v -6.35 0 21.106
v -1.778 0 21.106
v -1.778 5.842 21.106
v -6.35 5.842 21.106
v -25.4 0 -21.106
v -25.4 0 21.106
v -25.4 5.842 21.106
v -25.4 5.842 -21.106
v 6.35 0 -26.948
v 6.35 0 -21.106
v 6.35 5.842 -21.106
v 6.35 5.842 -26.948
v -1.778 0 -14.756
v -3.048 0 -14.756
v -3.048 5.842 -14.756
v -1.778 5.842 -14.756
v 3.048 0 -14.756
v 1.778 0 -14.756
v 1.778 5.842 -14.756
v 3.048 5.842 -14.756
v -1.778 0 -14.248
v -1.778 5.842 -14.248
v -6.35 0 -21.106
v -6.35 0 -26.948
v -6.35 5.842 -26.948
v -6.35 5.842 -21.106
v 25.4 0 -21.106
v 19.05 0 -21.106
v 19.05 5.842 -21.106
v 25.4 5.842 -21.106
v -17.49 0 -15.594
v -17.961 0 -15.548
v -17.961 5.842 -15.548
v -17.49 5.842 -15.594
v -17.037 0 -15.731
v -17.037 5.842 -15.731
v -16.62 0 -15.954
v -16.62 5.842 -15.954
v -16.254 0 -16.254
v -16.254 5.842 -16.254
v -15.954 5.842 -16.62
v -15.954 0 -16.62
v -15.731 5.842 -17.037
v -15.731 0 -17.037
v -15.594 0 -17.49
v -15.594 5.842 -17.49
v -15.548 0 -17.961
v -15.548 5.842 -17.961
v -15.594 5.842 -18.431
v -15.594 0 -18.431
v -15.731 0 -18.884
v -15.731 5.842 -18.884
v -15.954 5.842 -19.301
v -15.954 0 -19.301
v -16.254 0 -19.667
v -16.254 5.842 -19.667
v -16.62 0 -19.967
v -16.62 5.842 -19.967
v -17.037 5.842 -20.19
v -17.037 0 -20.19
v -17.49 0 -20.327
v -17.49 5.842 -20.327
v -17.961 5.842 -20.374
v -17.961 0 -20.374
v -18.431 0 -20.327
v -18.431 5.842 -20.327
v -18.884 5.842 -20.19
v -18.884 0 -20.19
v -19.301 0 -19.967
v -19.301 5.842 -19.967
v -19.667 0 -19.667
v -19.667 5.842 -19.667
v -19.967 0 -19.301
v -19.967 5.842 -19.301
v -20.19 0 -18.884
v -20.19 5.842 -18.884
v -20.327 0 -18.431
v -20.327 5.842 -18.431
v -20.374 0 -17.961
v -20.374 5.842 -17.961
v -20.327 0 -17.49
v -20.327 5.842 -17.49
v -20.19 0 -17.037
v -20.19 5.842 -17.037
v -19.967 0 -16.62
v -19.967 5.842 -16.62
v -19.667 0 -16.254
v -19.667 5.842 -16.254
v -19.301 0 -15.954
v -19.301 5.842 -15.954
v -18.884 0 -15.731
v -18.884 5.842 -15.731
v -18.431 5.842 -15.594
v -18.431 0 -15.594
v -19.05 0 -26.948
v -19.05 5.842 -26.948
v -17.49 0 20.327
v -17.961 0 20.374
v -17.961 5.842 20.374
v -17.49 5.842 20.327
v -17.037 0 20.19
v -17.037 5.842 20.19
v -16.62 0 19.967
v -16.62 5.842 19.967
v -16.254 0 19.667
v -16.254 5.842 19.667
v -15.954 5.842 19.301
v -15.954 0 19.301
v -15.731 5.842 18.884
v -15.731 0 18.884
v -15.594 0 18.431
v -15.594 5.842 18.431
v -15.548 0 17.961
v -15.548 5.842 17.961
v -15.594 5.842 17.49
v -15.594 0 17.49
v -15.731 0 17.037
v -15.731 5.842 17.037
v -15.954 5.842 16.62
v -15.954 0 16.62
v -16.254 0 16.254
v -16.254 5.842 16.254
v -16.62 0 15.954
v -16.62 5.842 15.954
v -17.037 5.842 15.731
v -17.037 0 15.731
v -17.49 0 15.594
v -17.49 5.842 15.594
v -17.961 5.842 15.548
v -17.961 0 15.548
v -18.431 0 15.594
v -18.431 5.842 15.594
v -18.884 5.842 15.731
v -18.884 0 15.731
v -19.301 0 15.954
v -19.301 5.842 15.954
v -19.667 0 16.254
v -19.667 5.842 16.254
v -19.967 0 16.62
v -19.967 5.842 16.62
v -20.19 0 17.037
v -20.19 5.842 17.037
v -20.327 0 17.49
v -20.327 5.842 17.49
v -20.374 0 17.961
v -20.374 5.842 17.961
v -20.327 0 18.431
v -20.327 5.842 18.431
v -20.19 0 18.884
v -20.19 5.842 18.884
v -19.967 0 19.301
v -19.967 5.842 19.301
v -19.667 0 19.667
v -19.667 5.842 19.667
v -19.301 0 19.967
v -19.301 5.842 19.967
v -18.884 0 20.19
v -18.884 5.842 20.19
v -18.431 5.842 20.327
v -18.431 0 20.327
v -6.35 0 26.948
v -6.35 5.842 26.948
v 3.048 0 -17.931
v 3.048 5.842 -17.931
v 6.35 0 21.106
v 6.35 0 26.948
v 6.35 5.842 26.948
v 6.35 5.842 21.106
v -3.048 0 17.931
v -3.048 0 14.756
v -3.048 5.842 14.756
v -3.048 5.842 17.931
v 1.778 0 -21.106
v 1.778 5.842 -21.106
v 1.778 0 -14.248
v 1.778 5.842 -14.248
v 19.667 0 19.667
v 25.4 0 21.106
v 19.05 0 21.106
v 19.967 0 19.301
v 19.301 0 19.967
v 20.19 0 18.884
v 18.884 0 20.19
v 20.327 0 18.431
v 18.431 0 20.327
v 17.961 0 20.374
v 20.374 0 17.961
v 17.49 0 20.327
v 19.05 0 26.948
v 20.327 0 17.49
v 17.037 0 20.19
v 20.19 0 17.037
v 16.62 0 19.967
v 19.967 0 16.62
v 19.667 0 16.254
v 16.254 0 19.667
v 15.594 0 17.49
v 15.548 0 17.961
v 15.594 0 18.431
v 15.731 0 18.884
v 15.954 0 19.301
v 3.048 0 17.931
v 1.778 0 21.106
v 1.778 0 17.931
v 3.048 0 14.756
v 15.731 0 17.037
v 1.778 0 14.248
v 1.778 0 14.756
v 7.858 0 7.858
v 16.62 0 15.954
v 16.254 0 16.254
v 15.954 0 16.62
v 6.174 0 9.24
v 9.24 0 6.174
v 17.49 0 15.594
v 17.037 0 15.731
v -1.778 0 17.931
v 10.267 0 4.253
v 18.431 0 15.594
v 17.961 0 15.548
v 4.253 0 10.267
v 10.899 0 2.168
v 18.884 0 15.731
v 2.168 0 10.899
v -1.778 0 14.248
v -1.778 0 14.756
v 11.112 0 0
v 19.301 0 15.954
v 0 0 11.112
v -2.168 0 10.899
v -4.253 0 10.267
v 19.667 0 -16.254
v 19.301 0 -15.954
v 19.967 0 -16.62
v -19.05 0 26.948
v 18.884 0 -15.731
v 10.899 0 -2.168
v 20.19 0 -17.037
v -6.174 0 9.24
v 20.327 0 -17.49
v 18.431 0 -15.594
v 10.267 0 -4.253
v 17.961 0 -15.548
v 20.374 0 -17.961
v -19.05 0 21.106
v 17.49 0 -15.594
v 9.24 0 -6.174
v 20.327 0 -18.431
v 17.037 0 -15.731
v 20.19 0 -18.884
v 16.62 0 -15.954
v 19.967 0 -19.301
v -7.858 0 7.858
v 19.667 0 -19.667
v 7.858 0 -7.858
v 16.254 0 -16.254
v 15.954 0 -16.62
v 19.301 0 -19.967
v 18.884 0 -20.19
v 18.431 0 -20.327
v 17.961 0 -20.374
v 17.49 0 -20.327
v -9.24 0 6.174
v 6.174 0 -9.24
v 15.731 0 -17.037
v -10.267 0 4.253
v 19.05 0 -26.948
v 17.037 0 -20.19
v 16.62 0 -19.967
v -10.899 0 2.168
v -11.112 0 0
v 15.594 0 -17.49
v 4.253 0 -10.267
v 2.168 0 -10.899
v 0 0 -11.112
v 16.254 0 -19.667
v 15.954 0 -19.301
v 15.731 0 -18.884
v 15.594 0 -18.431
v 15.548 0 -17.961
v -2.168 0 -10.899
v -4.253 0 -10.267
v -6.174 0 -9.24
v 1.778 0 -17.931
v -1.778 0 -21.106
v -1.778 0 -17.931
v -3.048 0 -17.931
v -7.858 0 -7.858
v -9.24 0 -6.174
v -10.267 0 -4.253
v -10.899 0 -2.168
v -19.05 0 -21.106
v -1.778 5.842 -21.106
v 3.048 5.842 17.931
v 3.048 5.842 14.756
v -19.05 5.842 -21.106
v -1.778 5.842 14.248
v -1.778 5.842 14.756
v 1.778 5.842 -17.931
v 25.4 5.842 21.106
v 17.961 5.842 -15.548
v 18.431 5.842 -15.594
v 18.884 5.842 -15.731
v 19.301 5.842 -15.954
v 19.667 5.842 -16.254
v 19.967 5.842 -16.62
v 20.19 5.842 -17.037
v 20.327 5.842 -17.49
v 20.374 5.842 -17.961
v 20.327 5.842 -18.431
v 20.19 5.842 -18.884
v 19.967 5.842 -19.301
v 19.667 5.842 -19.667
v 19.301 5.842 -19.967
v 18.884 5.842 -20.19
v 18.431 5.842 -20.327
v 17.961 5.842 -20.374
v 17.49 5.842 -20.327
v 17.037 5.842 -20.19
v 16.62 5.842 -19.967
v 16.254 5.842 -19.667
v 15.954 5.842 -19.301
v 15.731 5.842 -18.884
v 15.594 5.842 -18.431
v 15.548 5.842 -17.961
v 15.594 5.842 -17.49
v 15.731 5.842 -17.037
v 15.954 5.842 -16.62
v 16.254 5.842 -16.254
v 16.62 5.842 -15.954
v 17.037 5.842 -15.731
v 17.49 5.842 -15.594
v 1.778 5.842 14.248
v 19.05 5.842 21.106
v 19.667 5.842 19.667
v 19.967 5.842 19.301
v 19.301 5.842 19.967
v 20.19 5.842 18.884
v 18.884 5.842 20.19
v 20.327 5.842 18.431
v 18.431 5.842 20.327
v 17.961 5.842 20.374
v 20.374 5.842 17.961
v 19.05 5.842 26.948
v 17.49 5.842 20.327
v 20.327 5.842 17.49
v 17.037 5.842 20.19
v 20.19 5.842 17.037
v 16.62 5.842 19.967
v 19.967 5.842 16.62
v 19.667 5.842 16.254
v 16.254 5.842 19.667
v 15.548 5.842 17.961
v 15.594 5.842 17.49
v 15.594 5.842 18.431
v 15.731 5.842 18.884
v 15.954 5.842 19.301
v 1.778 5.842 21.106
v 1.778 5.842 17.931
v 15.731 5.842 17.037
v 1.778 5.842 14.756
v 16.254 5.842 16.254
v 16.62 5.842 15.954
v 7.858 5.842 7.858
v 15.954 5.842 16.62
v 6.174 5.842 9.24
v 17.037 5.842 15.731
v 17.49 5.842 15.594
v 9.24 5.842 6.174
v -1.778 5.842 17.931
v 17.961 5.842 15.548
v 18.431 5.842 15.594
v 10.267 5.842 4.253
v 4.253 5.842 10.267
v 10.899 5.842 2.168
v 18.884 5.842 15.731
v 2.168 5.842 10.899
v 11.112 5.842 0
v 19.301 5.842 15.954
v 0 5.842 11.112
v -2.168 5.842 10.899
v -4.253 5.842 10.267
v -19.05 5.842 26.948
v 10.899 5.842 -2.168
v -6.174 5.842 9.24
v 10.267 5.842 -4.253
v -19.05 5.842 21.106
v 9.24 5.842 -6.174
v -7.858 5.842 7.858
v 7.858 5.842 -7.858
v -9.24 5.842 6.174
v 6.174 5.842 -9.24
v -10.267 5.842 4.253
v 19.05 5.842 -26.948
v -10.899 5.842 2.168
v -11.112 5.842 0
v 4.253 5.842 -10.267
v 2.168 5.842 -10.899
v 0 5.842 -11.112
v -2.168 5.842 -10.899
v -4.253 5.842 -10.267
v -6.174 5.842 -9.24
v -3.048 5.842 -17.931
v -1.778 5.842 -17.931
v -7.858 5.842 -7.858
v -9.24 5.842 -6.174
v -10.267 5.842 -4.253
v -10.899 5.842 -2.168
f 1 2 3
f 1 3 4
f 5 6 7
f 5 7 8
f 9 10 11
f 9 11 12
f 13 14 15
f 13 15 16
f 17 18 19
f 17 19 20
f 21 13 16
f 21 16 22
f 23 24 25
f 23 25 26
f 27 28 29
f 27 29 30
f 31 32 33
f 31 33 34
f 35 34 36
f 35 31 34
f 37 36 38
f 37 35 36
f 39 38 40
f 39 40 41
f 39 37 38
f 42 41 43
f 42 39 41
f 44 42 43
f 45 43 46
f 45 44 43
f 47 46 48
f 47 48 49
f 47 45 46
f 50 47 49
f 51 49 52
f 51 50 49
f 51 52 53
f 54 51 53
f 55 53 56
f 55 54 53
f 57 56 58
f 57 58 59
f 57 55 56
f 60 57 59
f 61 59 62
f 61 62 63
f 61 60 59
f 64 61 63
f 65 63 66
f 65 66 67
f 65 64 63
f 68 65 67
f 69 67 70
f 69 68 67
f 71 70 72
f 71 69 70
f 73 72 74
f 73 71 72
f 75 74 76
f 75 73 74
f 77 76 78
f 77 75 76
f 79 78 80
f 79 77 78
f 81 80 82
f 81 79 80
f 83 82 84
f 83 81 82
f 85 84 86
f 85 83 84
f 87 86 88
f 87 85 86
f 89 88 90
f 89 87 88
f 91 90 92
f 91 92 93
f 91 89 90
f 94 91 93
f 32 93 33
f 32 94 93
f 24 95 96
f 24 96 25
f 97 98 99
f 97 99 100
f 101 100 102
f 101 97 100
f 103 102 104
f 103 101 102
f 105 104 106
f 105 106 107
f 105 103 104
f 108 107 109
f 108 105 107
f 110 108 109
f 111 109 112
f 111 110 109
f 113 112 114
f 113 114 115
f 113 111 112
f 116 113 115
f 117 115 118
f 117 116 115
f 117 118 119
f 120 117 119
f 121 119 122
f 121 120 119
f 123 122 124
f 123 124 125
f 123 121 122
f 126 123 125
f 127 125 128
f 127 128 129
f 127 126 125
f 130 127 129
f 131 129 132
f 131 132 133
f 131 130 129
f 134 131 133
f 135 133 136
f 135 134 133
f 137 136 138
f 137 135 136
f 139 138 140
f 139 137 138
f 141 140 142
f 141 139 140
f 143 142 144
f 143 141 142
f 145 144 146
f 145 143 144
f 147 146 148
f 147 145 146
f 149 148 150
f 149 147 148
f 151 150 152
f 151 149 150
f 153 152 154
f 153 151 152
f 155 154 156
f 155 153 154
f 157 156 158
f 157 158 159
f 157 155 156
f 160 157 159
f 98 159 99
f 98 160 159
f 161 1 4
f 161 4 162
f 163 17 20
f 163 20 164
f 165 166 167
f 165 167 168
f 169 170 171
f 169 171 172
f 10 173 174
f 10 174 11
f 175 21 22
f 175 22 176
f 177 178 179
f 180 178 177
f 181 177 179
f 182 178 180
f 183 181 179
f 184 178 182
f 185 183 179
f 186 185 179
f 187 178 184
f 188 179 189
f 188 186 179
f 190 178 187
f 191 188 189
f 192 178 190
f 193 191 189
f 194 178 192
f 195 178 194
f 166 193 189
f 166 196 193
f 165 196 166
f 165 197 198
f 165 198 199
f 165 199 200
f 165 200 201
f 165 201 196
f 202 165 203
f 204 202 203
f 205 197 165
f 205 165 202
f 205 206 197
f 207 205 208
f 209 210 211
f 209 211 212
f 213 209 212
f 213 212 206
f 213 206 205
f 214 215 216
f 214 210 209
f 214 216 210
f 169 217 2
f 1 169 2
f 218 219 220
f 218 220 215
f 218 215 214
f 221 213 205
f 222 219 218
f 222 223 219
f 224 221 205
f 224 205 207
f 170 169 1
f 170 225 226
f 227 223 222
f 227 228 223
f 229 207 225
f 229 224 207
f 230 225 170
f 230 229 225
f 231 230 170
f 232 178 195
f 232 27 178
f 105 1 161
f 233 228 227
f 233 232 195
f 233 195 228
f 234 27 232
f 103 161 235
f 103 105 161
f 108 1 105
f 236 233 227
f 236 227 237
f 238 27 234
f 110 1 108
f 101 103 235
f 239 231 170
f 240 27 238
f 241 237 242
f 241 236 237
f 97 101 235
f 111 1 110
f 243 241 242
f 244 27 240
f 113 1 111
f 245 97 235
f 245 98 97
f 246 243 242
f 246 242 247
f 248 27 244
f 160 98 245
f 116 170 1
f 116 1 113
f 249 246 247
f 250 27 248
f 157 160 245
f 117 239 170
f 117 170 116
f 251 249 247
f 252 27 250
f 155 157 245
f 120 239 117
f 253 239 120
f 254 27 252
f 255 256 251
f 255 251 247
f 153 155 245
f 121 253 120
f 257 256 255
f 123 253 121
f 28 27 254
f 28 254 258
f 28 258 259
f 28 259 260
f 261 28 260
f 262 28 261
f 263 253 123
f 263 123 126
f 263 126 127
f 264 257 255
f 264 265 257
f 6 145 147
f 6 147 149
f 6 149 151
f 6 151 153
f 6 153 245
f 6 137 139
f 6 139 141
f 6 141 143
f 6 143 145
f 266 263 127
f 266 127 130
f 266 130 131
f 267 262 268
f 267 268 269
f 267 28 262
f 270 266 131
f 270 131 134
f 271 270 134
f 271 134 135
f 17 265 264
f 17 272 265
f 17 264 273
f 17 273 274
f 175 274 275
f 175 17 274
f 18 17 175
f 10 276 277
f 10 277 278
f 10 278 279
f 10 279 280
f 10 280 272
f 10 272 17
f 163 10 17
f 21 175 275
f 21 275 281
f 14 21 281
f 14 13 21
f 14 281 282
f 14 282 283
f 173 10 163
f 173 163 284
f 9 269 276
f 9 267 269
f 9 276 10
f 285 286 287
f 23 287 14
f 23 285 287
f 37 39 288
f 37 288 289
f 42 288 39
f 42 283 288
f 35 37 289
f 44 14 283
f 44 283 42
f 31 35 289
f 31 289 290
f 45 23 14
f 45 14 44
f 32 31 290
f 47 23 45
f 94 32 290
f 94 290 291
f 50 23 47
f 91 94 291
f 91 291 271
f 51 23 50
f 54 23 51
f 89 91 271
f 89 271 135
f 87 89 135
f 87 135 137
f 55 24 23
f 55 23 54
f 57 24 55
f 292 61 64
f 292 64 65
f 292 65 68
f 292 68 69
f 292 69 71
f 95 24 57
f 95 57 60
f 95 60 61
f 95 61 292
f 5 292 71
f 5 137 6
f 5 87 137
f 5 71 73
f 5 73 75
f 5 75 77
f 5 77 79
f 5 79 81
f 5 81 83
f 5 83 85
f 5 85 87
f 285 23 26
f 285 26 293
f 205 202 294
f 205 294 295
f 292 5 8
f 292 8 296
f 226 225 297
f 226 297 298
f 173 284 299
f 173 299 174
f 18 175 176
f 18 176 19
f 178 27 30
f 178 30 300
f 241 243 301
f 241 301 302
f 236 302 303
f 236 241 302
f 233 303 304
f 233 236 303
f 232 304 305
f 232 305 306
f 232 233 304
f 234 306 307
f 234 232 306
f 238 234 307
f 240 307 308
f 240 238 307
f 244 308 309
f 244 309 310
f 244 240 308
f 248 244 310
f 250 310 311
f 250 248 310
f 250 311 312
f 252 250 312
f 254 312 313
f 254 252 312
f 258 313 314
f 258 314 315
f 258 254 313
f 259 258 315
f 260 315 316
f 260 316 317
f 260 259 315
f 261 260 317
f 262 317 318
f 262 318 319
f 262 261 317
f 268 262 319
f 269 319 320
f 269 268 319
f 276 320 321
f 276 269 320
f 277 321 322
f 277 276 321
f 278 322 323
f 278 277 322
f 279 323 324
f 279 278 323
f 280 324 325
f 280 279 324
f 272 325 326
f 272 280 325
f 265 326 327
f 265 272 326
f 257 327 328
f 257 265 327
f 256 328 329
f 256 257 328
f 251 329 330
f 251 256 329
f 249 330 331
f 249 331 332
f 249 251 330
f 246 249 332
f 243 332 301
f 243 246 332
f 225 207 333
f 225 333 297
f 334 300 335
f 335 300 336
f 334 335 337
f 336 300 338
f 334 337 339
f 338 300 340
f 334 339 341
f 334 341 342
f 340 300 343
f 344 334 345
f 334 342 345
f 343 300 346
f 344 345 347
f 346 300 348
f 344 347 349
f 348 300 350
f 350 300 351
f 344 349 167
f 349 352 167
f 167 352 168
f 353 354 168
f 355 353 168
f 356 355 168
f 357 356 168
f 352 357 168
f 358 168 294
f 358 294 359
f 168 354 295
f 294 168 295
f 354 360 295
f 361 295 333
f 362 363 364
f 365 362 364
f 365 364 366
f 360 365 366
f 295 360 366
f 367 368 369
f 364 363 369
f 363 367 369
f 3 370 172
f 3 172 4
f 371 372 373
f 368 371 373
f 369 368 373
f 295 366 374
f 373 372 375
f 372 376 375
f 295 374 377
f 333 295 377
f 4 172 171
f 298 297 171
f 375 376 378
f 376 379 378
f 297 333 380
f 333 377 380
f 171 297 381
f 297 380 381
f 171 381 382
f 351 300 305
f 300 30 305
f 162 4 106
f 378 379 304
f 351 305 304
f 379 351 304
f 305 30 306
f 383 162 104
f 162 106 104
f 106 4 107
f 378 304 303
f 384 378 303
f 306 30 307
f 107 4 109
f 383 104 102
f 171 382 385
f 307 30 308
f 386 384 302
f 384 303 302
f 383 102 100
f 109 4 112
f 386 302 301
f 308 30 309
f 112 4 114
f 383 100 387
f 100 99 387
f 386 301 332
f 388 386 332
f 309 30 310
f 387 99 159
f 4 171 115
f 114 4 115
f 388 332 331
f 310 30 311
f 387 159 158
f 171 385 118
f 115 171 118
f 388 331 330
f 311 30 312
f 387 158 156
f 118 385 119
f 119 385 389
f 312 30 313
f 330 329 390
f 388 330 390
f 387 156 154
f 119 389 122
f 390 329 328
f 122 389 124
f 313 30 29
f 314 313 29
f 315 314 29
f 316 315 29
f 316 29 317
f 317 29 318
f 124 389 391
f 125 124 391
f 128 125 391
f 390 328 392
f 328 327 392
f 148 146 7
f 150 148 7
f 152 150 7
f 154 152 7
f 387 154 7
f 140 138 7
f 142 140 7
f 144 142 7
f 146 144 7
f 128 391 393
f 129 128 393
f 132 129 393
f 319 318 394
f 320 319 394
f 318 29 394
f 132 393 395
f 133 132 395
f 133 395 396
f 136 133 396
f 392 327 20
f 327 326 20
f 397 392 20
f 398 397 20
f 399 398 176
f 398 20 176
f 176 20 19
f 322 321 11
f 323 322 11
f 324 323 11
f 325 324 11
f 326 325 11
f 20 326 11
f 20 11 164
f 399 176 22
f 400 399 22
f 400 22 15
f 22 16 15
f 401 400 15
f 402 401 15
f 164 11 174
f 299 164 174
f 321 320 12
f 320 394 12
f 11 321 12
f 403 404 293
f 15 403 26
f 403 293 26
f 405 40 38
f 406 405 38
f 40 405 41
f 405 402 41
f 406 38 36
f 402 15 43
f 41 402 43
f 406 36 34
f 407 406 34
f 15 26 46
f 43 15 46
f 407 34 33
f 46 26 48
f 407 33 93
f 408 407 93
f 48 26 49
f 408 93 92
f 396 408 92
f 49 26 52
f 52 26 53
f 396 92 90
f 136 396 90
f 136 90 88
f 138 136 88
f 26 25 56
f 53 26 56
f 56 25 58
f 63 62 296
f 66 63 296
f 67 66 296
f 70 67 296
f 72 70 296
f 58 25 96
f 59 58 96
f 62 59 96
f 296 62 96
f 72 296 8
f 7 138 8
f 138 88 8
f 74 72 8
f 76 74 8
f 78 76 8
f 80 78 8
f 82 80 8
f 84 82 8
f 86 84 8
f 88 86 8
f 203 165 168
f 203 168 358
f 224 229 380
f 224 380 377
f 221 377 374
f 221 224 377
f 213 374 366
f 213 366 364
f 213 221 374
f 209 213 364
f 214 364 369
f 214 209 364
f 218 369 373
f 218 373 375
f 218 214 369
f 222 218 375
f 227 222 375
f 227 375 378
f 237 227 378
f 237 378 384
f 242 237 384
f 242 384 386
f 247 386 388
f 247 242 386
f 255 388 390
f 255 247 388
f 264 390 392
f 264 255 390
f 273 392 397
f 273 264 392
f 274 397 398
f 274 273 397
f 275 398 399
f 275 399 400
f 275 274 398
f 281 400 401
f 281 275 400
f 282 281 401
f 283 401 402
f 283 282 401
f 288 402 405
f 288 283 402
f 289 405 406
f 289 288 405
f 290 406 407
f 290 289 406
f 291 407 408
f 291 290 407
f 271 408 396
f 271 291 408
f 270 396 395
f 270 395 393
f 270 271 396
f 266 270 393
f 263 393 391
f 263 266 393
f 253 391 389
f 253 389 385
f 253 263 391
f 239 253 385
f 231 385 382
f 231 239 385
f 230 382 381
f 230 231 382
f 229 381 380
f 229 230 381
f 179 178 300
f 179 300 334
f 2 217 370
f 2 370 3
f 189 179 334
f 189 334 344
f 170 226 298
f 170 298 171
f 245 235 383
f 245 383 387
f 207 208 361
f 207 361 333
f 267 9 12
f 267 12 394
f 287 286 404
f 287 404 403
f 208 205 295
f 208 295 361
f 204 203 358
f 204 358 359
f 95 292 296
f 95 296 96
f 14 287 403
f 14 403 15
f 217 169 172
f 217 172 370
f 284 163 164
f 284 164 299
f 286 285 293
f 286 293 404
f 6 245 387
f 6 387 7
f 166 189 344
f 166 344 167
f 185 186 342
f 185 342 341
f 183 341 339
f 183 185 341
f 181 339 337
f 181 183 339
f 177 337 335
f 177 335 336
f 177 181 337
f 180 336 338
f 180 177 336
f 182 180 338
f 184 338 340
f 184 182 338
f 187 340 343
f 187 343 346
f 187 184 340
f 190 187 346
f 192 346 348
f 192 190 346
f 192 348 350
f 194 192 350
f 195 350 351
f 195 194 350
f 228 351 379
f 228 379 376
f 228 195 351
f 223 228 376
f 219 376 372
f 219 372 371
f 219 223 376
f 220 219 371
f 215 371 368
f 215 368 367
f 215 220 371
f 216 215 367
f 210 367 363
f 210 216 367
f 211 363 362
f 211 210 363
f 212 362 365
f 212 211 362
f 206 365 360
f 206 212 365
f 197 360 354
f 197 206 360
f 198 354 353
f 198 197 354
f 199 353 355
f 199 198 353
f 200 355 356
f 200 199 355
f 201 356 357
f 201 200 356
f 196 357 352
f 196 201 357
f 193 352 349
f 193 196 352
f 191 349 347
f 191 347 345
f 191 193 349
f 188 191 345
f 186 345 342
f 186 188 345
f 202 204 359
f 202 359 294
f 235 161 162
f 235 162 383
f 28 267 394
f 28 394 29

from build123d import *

# Parameters (mm, degrees)
SKETCH1_R           = 11.1125
SKETCH1_R_2         = 2.413
BOSS_EXTRUDE1_DEPTH = 5.842


with BuildPart() as part:
    # Sketch1 → Boss-Extrude1 (new body)
    with BuildSketch(Plane(origin=(0, 0, 0), x_dir=(1, 0, 0), z_dir=(0, 1, 0))):
        Polygon((25.4, -21.1058), (19.05, -21.1058), (19.05, -26.9478), (6.35, -26.9478), (6.35, -21.1058), (1.778, -21.1058), (1.778, -17.9308), (3.048, -17.9308), (3.048, -14.7558), (1.778, -14.7558), (1.778, -14.2478), (-1.778, -14.2478), (-1.778, -14.7558), (-3.048, -14.7558), (-3.048, -17.9308), (-1.778, -17.9308), (-1.778, -21.1058), (-6.35, -21.1058), (-6.35, -26.9478), (-19.05, -26.9478), (-19.05, -21.1058), (-25.4, -21.1058), (-25.4, 21.1058), (-19.05, 21.1058), (-19.05, 26.9478), (-6.35, 26.9478), (-6.35, 21.1058), (-1.778, 21.1058), (-1.778, 17.9308), (-3.048, 17.9308), (-3.048, 14.7558), (-1.778, 14.7558), (-1.778, 14.2478), (1.778, 14.2478), (1.778, 14.7558), (3.048, 14.7558), (3.048, 17.9308), (1.778, 17.9308), (1.778, 21.1058), (6.35, 21.1058), (6.35, 26.9478), (19.05, 26.9478), (19.05, 21.1058), (25.4, 21.1058), align=None)
        with Locations(Location((0, 0, 0), (0, 0, 270))):
            Circle(SKETCH1_R, mode=Mode.SUBTRACT)
        with Locations(Location((-17.960512242, 17.960512242, 0), (0, 0, 270))):
            Circle(SKETCH1_R_2, mode=Mode.SUBTRACT)
        with Locations(Location((17.960512242, 17.960512242, 0), (0, 0, 270))):
            Circle(SKETCH1_R_2, mode=Mode.SUBTRACT)
        with Locations(Location((17.960512242, -17.960512242, 0), (0, 0, 270))):
            Circle(SKETCH1_R_2, mode=Mode.SUBTRACT)
        with Locations(Location((-17.960512242, -17.960512242, 0), (0, 0, 270))):
            Circle(SKETCH1_R_2, mode=Mode.SUBTRACT)
    extrude(amount=BOSS_EXTRUDE1_DEPTH)


solid = part.part
